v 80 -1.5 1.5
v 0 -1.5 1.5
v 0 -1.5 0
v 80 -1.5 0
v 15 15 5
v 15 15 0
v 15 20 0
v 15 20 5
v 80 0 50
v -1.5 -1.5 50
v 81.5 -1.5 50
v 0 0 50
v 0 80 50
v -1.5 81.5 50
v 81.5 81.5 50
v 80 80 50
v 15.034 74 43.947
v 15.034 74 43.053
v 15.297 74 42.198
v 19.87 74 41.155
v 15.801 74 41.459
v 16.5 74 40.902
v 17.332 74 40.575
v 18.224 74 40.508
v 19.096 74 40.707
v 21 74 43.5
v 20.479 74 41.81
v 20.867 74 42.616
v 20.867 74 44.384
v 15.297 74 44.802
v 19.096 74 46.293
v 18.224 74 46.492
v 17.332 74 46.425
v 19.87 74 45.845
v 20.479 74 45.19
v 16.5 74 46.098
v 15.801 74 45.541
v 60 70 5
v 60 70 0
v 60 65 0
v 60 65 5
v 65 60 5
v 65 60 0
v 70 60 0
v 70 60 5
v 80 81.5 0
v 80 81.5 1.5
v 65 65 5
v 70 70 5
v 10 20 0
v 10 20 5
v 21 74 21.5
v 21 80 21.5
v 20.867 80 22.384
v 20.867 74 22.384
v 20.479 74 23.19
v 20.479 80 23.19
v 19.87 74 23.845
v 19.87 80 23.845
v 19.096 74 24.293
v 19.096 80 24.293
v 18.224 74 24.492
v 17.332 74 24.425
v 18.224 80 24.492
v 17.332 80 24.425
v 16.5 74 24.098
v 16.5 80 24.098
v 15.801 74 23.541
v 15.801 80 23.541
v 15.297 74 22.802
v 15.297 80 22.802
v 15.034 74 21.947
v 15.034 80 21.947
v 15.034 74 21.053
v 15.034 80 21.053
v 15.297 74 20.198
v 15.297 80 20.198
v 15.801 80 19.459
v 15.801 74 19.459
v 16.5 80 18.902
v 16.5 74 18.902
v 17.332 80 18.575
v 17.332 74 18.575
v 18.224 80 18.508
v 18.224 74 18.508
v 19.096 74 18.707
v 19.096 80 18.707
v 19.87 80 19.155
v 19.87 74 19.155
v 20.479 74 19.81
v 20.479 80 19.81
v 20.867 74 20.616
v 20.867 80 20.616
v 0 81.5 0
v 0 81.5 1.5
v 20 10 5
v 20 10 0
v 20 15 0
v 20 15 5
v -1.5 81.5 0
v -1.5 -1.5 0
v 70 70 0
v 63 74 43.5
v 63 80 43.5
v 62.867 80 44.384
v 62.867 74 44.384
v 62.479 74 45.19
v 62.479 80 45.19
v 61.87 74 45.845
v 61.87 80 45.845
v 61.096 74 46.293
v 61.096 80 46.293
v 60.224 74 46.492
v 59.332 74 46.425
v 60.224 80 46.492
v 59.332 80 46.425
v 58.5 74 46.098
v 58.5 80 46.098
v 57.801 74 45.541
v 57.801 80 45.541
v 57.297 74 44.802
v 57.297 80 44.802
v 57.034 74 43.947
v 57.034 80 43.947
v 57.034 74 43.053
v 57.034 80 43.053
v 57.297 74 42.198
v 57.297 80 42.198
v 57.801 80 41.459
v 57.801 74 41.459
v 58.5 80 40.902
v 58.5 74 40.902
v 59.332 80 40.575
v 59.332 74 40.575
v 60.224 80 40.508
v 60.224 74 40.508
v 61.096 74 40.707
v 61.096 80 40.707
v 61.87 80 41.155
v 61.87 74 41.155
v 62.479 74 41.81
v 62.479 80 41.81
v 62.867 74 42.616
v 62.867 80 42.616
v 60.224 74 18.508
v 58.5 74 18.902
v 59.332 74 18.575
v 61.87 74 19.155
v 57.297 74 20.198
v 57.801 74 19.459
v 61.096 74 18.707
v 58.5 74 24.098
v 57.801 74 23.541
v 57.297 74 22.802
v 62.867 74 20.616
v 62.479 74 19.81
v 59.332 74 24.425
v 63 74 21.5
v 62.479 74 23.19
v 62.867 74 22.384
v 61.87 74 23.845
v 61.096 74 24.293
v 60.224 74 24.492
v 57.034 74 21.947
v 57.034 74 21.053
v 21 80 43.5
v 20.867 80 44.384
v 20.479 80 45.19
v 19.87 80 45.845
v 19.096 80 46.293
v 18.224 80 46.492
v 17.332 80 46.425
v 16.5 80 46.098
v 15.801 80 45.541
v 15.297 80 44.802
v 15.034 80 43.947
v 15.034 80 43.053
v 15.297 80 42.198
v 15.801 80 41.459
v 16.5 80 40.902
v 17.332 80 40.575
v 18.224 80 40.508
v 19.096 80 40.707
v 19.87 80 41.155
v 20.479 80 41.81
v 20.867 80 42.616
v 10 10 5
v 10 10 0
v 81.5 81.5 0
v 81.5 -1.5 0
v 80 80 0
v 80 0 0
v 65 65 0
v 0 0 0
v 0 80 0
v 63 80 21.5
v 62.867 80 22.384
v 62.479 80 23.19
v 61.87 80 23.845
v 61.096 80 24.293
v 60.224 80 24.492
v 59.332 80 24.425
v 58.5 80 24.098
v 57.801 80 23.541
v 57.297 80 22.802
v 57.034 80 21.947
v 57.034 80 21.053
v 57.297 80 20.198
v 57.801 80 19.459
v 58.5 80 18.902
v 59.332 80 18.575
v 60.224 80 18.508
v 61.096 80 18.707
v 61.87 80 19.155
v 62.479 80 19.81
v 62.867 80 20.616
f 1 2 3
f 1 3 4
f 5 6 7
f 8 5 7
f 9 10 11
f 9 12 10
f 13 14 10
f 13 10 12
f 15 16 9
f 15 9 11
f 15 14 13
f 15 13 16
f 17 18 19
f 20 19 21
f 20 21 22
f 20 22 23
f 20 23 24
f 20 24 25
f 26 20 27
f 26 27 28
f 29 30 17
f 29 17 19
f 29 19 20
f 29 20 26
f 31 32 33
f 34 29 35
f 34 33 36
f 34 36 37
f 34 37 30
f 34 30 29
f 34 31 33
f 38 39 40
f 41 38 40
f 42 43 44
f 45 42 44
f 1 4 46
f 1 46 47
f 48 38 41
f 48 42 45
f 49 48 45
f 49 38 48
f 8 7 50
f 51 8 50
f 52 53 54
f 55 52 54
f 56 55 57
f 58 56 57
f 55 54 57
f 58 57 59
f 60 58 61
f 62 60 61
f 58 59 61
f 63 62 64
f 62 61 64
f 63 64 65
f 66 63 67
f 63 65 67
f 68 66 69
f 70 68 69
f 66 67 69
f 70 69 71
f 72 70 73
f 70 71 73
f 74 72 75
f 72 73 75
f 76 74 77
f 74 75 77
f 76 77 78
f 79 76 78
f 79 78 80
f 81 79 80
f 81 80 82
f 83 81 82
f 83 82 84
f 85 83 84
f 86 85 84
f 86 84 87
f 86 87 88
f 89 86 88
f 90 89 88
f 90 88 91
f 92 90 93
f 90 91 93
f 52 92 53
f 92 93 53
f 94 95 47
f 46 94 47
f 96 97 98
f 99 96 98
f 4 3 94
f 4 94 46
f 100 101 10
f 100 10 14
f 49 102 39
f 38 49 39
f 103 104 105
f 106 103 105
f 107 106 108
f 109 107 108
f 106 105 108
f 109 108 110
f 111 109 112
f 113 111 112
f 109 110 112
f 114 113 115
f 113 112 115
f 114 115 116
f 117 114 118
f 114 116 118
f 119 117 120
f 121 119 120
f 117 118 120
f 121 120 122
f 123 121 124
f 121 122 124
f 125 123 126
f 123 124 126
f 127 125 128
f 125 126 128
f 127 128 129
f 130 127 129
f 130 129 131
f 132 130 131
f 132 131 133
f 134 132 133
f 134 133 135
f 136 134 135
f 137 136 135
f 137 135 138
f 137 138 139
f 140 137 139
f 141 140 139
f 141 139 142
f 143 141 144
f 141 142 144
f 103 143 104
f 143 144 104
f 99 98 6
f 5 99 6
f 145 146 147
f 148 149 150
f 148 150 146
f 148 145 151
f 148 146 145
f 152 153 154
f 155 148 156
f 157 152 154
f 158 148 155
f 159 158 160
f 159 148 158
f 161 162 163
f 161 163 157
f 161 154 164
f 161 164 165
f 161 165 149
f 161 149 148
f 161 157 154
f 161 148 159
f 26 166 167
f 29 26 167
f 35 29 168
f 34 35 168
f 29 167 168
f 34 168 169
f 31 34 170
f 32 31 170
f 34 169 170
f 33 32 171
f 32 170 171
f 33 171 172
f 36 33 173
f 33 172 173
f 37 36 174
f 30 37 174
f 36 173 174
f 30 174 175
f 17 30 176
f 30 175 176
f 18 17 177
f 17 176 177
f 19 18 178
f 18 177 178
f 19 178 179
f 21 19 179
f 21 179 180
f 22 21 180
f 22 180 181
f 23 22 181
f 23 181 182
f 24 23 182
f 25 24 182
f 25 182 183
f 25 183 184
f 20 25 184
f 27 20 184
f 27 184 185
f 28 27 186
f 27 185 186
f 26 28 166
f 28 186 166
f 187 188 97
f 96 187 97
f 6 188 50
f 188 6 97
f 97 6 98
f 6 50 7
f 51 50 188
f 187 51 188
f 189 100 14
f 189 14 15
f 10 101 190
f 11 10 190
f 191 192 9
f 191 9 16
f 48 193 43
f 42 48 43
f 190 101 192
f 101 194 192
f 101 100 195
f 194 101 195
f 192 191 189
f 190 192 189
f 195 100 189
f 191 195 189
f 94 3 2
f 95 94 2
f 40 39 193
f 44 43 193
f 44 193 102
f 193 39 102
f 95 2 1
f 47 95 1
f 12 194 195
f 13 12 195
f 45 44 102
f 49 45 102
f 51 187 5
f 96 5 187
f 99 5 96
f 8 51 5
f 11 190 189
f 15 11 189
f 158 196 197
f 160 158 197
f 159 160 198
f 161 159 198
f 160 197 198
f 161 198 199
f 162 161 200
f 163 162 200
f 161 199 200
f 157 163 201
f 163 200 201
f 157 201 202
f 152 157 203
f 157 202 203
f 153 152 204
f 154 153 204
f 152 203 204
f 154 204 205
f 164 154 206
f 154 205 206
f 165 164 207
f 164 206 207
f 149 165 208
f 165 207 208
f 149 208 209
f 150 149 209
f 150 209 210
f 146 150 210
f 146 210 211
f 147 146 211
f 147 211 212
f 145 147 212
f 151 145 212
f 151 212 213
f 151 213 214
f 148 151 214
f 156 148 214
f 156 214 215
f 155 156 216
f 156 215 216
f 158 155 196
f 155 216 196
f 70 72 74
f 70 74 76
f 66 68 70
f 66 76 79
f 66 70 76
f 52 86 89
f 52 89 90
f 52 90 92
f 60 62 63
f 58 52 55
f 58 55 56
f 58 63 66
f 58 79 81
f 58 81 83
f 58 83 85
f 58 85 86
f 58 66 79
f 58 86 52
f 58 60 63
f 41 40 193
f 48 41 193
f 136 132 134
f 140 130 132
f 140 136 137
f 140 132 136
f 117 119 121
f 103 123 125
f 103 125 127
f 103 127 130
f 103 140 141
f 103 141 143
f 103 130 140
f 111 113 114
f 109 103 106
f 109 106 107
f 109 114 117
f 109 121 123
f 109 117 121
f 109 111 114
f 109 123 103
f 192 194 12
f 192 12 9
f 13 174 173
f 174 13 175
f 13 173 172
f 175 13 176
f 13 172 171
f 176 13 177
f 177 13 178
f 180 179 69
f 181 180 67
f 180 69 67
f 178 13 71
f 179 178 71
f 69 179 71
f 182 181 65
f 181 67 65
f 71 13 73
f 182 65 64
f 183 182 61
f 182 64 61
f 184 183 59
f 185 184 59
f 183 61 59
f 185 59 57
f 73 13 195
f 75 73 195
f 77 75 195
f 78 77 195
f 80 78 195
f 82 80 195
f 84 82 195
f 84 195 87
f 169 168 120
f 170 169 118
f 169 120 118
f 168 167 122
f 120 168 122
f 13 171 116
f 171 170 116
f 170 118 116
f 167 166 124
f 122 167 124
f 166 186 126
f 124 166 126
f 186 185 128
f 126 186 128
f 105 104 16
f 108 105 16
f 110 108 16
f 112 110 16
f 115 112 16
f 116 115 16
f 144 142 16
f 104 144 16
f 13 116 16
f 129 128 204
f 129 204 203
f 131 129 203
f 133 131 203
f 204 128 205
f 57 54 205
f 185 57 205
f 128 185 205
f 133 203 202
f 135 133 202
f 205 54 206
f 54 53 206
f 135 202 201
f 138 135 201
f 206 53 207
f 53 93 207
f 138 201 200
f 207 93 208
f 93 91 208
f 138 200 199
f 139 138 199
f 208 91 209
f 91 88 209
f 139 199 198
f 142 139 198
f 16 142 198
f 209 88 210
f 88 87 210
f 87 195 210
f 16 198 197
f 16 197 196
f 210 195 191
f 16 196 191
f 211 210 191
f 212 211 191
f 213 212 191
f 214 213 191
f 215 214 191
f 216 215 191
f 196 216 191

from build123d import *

# Parameters (mm, degrees)
F1_DEPTH = 5
F0_W     = 83
F0_H     = 83
F0_W_2   = 80
F0_H_2   = 80
F2_DEPTH = 50
F3_W     = 80
F3_H     = 1.5
F4_DEPTH = 83
F5_R     = 3
F6_DEPTH = 6


with BuildPart() as f1:
    # F0 (on Top) → F1 (new body)
    with BuildSketch(Plane.XY):
        Polygon((20, 15), (15, 15), (15, 20), (10, 20), (10, 10), (20, 10), align=None)
        Polygon((60, 70), (60, 65), (65, 65), (65, 60), (70, 60), (70, 70), align=None)
    extrude(amount=F1_DEPTH)


with BuildPart() as f2:
    # F0 (on Top) → F2 (new body)
    with BuildSketch(Plane.XY):
        with Locations((40, 40)):
            Rectangle(F0_W, F0_H)
        with Locations((40, 40)):
            Rectangle(F0_W_2, F0_H_2, mode=Mode.SUBTRACT)
    extrude(amount=F2_DEPTH)

    # F5 (on face) → F6 (join)
    with BuildSketch(Plane.XZ.offset(-80)):
        with Locations((18, 43.5)):
            Circle(F5_R)
        with Locations((60, 43.5)):
            Circle(F5_R)
        with Locations((18, 21.5)):
            Circle(F5_R)
        with Locations((60, 21.5)):
            Circle(F5_R)
    extrude(amount=F6_DEPTH)


with BuildPart() as f4:
    # F3 (on face) → F4 (new body)
    with BuildSketch(Plane.XZ.offset(1.5)):
        with Locations((40, 0.75)):
            Rectangle(F3_W, F3_H)
    extrude(amount=-F4_DEPTH)


solid = Compound([f1.part, f2.part, f4.part])
